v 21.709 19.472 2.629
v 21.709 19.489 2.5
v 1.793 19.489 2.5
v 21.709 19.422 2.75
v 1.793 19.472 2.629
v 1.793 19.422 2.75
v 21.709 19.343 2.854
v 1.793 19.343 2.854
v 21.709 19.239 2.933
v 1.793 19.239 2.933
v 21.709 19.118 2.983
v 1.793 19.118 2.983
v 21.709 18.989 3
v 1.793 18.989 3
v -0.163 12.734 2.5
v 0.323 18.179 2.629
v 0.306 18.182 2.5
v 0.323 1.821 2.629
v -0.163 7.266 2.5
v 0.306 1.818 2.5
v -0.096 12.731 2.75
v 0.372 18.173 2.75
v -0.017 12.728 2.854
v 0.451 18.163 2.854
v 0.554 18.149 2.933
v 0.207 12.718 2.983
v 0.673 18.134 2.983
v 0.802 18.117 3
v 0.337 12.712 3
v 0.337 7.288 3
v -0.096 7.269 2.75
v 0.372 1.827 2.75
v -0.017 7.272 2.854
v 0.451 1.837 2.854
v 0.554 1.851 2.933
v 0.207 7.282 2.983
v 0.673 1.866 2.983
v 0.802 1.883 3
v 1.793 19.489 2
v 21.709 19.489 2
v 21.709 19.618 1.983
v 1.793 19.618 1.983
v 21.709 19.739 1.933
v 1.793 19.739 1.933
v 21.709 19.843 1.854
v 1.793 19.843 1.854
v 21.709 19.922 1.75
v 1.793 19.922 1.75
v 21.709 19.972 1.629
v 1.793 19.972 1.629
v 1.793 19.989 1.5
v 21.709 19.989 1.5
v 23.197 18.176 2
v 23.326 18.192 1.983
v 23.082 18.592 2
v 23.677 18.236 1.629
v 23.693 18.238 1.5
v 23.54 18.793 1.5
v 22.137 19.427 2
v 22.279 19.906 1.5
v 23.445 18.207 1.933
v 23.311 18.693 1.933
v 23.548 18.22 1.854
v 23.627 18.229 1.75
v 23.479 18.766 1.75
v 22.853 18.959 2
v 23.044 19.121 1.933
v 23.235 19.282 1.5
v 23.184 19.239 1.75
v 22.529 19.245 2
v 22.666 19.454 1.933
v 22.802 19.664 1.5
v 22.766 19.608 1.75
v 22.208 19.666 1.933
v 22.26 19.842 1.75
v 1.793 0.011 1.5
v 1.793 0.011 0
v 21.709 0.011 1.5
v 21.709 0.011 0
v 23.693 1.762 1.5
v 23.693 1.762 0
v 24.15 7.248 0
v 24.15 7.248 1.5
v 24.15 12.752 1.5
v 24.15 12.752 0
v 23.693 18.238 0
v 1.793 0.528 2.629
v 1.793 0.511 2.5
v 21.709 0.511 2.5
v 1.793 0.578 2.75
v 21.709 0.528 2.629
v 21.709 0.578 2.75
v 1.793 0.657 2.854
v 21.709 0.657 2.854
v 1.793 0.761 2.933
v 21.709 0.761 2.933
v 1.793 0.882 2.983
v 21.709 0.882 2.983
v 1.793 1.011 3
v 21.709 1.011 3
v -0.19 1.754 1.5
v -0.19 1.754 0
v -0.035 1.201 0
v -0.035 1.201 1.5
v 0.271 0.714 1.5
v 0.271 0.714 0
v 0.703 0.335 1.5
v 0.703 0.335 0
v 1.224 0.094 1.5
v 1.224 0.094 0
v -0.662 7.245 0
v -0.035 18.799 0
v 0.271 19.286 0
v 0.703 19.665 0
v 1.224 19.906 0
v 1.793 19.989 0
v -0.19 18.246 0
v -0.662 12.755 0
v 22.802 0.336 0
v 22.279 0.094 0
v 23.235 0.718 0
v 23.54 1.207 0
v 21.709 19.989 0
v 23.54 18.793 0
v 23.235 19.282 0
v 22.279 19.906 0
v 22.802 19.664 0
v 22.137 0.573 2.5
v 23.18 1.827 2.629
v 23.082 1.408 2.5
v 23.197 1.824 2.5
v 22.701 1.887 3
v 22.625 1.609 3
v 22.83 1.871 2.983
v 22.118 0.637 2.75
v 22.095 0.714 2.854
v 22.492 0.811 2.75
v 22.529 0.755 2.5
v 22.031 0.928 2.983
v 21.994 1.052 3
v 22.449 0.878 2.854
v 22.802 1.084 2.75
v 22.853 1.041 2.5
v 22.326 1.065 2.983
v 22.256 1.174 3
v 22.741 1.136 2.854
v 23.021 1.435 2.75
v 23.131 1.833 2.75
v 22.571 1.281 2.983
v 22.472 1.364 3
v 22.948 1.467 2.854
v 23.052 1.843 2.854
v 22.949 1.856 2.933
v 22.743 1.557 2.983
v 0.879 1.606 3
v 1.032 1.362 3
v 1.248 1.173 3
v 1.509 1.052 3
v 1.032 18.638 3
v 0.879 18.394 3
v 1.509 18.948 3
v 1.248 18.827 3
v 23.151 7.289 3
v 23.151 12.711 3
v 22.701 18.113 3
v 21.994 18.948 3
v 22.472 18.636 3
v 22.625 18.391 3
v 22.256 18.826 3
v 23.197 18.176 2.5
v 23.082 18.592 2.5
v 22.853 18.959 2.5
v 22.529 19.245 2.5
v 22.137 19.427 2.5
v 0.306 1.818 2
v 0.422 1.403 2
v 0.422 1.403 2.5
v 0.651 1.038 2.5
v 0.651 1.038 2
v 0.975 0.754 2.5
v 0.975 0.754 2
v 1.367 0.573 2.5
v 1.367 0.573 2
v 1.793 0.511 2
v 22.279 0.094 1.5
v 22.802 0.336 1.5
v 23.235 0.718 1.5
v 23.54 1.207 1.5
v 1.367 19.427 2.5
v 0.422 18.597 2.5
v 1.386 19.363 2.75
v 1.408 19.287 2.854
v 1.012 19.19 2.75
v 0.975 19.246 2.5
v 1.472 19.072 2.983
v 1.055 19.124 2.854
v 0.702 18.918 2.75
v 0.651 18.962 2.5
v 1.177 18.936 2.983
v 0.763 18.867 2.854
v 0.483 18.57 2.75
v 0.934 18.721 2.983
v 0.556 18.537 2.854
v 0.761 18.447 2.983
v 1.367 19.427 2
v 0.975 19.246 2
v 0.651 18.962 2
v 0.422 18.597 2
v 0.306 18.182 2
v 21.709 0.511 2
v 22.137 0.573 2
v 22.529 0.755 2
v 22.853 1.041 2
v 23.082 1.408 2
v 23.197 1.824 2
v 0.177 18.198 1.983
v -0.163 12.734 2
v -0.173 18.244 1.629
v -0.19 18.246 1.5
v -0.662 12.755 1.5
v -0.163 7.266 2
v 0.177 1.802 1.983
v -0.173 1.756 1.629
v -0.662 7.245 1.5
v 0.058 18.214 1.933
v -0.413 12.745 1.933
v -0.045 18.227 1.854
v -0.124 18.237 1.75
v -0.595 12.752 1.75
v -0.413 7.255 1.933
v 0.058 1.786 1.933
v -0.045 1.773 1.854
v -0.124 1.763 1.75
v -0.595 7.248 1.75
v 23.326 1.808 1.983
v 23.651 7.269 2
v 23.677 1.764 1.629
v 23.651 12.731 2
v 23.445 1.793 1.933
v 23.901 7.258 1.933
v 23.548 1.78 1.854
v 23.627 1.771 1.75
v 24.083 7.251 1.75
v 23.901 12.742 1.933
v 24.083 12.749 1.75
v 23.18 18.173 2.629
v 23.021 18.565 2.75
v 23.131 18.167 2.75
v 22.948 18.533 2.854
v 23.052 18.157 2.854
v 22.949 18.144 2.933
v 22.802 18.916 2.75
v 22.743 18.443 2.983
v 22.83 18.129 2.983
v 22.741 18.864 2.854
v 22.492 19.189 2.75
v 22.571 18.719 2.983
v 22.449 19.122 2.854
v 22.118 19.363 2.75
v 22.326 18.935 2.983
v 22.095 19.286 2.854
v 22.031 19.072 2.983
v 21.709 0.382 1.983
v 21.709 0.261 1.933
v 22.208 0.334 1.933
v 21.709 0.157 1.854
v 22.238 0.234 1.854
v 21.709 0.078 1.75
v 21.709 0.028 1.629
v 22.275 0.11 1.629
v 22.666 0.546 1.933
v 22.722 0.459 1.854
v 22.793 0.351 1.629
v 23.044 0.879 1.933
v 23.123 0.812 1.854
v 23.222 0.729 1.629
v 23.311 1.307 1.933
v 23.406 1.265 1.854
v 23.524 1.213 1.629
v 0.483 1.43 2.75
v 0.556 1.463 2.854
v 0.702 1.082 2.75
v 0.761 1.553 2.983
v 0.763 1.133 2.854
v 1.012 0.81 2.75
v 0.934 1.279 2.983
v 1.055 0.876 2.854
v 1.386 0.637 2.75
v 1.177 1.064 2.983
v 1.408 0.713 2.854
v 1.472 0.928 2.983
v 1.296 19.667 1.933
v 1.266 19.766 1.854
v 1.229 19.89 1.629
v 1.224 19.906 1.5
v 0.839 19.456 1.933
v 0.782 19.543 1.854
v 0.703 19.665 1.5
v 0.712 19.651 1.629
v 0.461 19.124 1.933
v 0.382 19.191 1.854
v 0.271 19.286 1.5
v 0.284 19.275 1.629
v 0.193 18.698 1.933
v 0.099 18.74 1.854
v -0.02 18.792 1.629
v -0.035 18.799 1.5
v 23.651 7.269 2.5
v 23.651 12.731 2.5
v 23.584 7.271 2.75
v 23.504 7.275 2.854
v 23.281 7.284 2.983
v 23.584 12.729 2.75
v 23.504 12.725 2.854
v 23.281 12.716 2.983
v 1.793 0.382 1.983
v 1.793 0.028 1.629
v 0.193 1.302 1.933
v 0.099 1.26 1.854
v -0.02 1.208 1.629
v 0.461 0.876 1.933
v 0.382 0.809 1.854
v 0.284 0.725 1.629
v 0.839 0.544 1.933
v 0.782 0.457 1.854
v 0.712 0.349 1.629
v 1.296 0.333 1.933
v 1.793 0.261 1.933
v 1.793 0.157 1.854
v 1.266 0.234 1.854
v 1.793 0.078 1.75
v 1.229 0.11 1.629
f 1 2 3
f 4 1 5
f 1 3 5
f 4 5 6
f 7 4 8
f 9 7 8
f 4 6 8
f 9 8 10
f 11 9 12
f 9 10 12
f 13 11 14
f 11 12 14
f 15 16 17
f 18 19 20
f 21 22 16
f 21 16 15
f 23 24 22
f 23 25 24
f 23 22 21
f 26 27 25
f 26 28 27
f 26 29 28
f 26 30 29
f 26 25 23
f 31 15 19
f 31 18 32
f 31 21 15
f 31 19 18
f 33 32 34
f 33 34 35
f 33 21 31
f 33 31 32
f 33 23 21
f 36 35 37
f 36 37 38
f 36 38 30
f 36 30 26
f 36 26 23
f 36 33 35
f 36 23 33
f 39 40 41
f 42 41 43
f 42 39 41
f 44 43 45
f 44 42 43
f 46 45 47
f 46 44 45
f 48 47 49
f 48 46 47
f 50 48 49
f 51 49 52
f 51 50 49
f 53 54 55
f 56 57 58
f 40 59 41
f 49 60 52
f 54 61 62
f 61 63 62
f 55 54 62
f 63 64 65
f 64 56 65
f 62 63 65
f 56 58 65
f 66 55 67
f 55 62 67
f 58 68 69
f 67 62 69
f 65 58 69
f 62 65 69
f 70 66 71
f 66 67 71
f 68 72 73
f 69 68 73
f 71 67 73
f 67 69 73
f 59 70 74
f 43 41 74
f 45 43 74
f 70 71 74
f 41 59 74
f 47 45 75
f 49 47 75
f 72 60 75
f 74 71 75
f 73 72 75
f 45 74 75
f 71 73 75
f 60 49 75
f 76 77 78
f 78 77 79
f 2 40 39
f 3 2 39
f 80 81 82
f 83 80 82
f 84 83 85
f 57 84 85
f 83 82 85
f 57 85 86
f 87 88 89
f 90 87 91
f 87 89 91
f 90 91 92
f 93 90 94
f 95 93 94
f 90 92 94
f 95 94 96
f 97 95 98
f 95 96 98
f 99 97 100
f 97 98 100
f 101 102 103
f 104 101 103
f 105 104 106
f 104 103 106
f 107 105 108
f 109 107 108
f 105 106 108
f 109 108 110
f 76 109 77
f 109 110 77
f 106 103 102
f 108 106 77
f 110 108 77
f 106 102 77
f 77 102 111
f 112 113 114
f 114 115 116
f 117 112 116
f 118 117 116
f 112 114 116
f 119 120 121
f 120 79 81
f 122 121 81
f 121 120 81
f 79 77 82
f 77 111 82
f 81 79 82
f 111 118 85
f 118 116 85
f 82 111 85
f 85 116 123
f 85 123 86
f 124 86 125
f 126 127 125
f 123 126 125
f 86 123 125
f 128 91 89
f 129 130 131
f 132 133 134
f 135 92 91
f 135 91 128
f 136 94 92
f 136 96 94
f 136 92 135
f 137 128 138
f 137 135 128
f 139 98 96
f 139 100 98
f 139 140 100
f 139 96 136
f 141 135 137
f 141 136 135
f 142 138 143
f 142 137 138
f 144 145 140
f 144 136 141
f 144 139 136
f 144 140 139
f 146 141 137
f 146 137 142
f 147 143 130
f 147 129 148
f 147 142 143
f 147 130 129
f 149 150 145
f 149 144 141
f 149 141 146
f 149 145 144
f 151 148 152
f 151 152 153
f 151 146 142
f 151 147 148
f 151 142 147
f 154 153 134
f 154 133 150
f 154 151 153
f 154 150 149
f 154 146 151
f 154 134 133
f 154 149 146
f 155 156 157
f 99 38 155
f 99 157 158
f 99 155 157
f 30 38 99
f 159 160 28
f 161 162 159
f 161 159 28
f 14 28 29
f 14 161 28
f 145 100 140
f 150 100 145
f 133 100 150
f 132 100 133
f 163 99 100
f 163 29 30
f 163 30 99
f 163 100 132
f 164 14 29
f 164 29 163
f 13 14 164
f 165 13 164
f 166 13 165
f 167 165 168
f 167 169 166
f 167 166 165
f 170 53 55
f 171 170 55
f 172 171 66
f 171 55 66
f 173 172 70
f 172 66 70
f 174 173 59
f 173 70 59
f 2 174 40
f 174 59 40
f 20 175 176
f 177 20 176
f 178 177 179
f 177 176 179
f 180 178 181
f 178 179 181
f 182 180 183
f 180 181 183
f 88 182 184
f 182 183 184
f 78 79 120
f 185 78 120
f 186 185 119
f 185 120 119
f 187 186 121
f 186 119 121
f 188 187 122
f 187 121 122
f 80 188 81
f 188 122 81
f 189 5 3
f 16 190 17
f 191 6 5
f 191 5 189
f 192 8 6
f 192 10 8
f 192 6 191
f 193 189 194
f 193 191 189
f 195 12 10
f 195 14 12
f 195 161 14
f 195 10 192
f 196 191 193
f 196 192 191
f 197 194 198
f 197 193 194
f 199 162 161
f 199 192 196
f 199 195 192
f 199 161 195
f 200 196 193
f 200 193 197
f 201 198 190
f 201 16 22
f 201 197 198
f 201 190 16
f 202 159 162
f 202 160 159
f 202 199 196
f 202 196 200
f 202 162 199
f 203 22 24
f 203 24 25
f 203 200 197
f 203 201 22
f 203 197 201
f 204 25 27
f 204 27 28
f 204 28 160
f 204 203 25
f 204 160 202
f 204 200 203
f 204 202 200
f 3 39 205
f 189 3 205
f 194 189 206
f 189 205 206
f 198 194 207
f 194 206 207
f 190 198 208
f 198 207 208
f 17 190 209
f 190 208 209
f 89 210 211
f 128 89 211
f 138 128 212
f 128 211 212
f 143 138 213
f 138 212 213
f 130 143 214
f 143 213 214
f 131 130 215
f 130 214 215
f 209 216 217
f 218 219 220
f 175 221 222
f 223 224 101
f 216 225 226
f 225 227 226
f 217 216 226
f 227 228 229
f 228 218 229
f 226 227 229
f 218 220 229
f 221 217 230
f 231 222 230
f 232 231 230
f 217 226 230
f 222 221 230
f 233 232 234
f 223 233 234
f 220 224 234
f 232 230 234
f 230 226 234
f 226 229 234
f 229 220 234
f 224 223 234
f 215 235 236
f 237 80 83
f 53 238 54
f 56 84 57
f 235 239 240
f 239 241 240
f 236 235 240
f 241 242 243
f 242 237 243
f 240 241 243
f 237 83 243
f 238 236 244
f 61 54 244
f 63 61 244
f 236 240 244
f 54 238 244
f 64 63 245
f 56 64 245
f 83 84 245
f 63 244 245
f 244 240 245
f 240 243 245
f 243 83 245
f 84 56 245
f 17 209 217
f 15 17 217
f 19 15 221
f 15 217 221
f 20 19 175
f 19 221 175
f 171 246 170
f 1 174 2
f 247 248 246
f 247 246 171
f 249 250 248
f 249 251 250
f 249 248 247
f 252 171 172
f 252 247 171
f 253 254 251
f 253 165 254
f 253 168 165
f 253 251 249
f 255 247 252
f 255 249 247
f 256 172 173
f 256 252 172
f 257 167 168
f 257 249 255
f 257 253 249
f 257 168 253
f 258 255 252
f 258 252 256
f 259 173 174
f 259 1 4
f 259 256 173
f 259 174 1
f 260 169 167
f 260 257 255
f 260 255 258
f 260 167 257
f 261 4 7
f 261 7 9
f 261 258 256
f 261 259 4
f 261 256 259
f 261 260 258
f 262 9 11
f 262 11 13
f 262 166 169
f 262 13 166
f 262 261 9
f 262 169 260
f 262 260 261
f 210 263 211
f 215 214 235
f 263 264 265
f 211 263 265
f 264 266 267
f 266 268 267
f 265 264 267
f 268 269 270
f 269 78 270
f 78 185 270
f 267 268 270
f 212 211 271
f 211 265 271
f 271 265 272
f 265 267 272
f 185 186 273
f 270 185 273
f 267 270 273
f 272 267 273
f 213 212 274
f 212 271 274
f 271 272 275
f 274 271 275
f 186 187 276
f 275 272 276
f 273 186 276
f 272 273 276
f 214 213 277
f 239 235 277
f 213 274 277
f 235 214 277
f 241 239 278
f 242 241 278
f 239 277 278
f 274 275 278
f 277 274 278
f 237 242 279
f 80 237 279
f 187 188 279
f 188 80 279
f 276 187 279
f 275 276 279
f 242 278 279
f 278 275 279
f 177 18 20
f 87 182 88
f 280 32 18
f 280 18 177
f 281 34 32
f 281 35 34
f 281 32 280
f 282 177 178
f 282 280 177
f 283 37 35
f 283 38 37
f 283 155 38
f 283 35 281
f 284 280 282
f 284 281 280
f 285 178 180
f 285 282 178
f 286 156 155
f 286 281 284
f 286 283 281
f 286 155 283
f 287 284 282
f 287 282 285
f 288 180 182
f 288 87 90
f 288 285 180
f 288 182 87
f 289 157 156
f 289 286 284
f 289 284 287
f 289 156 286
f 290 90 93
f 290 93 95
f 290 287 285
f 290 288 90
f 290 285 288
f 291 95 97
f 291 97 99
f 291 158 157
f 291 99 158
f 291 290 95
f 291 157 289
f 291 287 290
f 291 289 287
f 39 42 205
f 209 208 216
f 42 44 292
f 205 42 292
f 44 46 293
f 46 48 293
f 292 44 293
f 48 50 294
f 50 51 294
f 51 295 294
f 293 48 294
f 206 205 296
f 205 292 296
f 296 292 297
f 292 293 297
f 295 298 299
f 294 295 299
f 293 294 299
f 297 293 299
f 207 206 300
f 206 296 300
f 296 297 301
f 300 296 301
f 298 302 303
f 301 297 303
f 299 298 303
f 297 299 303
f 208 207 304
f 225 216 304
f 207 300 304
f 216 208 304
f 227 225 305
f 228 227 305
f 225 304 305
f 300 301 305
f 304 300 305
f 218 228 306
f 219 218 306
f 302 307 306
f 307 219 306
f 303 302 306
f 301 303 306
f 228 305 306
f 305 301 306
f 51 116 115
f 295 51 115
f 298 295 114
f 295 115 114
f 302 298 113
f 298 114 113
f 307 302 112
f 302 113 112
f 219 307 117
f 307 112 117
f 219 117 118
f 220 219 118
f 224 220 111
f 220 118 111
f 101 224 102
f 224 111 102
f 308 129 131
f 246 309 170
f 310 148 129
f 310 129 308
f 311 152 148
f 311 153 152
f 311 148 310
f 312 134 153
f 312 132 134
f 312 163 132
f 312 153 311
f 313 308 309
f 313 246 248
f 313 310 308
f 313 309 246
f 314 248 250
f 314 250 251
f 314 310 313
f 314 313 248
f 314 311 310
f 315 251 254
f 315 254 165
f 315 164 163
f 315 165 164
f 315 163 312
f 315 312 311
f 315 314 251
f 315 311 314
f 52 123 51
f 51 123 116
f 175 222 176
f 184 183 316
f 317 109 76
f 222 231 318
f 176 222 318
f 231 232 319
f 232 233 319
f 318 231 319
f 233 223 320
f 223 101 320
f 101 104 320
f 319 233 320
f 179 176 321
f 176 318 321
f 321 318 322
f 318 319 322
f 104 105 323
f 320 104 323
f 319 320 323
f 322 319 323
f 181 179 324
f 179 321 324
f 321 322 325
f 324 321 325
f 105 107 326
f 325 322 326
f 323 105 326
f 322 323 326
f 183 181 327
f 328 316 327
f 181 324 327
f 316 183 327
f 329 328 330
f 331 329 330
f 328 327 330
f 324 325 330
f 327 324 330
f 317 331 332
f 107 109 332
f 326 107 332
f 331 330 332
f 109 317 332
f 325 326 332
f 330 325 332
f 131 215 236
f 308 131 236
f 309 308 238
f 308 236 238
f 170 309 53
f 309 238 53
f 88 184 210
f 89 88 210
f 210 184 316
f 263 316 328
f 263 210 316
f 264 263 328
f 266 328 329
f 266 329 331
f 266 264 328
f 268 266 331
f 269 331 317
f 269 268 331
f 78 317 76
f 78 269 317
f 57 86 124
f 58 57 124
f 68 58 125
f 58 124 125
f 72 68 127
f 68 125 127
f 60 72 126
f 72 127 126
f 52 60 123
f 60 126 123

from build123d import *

# Parameters (mm, degrees)
F1_DEPTH = 2
F3_DEPTH = 1
F4_R     = 0.49999


# Not quite as in the source:
# - a fillet or chamfer is up to 0.001 mm smaller than in the source, because OpenCascade refuses the exact size
# - a feature names something its author has since deleted; it is built from what else it names


with BuildPart() as f1:
    # F0 (on Top) → F1 (new body)
    with BuildSketch(Plane.XY):
        with BuildLine():
            ThreePointArc((23.6934297445, 1.7622585683), (24.2075786729, 10), (23.6934297445, 18.2377414317))
            ThreePointArc((23.6934297445, 18.2377414317), (23.0323232276, 19.4886170119), (21.7089512216, 19.9890548979))
            Line((21.7089512216, 19.9890548979), (1.7932879128, 19.9890548979))
            ThreePointArc((1.7932879128, 19.9890548979), (0.4729381343, 19.491278737), (-0.1901730003, 18.2457313605))
            ThreePointArc((-0.1901730003, 18.2457313605), (-0.7214911689, 10), (-0.1901730003, 1.7542686395))
            ThreePointArc((-0.1901730003, 1.7542686395), (0.4729381343, 0.508721263), (1.7932879128, 0.0109451021))
            Line((1.7932879128, 0.0109451021), (21.7089512216, 0.0109451021))
            ThreePointArc((21.7089512216, 0.0109451021), (23.0323232276, 0.5113829881), (23.6934297445, 1.7622585683))
        make_face()
    extrude(amount=F1_DEPTH)

    # F2 (on face) → F3 (join)
    with BuildSketch(Plane.XY.offset(2)):
        with BuildLine():
            Line((21.7089512216, 19.4890548979), (1.7932879128, 19.4890548979))
            ThreePointArc((1.7932879128, 19.4890548979), (0.8030255789, 19.1157227772), (0.305692228, 18.1815622449))
            ThreePointArc((0.305692228, 18.1815622449), (-0.2214911689, 10), (0.305692228, 1.8184377551))
            ThreePointArc((0.305692228, 1.8184377551), (0.8030255789, 0.8842772228), (1.7932879128, 0.5109451021))
            Line((1.7932879128, 0.5109451021), (21.7089512216, 0.5109451021))
            ThreePointArc((21.7089512216, 0.5109451021), (22.7014802261, 0.8862735166), (23.1973101138, 1.8244302017))
            ThreePointArc((23.1973101138, 1.8244302017), (23.7075786729, 10), (23.1973101138, 18.1755697983))
            ThreePointArc((23.1973101138, 18.1755697983), (22.7014802261, 19.1137264834), (21.7089512216, 19.4890548979))
        make_face()
    extrude(amount=F3_DEPTH)

    # F4 (radius 0.5 in the source; OpenCascade refuses exactly that, so slightly less here)
    f4_edges = [f1.edges().sort_by_distance(p)[0] for p in [
        (11.75112, 0.010945, 2),
        (11.75112, 19.989055, 2),
        (23.032323, 0.511383, 2),
        (0.472938, 0.508721, 2),
        (24.207579, 10, 2),
        (-0.721491, 10, 2),
        (0.472938, 19.491279, 2),
        (23.032323, 19.488617, 2),
        (11.75112, 0.510945, 3),
        (0.803026, 0.884277, 3),
        (-0.221491, 10, 3),
        (11.75112, 19.489055, 3),
        (22.70148, 19.113726, 3),
        (23.707579, 10, 3),
        (0.803026, 19.115723, 3),
        (22.70148, 0.886274, 3),
    ]]
    fillet(f4_edges, radius=F4_R)


solid = f1.part
